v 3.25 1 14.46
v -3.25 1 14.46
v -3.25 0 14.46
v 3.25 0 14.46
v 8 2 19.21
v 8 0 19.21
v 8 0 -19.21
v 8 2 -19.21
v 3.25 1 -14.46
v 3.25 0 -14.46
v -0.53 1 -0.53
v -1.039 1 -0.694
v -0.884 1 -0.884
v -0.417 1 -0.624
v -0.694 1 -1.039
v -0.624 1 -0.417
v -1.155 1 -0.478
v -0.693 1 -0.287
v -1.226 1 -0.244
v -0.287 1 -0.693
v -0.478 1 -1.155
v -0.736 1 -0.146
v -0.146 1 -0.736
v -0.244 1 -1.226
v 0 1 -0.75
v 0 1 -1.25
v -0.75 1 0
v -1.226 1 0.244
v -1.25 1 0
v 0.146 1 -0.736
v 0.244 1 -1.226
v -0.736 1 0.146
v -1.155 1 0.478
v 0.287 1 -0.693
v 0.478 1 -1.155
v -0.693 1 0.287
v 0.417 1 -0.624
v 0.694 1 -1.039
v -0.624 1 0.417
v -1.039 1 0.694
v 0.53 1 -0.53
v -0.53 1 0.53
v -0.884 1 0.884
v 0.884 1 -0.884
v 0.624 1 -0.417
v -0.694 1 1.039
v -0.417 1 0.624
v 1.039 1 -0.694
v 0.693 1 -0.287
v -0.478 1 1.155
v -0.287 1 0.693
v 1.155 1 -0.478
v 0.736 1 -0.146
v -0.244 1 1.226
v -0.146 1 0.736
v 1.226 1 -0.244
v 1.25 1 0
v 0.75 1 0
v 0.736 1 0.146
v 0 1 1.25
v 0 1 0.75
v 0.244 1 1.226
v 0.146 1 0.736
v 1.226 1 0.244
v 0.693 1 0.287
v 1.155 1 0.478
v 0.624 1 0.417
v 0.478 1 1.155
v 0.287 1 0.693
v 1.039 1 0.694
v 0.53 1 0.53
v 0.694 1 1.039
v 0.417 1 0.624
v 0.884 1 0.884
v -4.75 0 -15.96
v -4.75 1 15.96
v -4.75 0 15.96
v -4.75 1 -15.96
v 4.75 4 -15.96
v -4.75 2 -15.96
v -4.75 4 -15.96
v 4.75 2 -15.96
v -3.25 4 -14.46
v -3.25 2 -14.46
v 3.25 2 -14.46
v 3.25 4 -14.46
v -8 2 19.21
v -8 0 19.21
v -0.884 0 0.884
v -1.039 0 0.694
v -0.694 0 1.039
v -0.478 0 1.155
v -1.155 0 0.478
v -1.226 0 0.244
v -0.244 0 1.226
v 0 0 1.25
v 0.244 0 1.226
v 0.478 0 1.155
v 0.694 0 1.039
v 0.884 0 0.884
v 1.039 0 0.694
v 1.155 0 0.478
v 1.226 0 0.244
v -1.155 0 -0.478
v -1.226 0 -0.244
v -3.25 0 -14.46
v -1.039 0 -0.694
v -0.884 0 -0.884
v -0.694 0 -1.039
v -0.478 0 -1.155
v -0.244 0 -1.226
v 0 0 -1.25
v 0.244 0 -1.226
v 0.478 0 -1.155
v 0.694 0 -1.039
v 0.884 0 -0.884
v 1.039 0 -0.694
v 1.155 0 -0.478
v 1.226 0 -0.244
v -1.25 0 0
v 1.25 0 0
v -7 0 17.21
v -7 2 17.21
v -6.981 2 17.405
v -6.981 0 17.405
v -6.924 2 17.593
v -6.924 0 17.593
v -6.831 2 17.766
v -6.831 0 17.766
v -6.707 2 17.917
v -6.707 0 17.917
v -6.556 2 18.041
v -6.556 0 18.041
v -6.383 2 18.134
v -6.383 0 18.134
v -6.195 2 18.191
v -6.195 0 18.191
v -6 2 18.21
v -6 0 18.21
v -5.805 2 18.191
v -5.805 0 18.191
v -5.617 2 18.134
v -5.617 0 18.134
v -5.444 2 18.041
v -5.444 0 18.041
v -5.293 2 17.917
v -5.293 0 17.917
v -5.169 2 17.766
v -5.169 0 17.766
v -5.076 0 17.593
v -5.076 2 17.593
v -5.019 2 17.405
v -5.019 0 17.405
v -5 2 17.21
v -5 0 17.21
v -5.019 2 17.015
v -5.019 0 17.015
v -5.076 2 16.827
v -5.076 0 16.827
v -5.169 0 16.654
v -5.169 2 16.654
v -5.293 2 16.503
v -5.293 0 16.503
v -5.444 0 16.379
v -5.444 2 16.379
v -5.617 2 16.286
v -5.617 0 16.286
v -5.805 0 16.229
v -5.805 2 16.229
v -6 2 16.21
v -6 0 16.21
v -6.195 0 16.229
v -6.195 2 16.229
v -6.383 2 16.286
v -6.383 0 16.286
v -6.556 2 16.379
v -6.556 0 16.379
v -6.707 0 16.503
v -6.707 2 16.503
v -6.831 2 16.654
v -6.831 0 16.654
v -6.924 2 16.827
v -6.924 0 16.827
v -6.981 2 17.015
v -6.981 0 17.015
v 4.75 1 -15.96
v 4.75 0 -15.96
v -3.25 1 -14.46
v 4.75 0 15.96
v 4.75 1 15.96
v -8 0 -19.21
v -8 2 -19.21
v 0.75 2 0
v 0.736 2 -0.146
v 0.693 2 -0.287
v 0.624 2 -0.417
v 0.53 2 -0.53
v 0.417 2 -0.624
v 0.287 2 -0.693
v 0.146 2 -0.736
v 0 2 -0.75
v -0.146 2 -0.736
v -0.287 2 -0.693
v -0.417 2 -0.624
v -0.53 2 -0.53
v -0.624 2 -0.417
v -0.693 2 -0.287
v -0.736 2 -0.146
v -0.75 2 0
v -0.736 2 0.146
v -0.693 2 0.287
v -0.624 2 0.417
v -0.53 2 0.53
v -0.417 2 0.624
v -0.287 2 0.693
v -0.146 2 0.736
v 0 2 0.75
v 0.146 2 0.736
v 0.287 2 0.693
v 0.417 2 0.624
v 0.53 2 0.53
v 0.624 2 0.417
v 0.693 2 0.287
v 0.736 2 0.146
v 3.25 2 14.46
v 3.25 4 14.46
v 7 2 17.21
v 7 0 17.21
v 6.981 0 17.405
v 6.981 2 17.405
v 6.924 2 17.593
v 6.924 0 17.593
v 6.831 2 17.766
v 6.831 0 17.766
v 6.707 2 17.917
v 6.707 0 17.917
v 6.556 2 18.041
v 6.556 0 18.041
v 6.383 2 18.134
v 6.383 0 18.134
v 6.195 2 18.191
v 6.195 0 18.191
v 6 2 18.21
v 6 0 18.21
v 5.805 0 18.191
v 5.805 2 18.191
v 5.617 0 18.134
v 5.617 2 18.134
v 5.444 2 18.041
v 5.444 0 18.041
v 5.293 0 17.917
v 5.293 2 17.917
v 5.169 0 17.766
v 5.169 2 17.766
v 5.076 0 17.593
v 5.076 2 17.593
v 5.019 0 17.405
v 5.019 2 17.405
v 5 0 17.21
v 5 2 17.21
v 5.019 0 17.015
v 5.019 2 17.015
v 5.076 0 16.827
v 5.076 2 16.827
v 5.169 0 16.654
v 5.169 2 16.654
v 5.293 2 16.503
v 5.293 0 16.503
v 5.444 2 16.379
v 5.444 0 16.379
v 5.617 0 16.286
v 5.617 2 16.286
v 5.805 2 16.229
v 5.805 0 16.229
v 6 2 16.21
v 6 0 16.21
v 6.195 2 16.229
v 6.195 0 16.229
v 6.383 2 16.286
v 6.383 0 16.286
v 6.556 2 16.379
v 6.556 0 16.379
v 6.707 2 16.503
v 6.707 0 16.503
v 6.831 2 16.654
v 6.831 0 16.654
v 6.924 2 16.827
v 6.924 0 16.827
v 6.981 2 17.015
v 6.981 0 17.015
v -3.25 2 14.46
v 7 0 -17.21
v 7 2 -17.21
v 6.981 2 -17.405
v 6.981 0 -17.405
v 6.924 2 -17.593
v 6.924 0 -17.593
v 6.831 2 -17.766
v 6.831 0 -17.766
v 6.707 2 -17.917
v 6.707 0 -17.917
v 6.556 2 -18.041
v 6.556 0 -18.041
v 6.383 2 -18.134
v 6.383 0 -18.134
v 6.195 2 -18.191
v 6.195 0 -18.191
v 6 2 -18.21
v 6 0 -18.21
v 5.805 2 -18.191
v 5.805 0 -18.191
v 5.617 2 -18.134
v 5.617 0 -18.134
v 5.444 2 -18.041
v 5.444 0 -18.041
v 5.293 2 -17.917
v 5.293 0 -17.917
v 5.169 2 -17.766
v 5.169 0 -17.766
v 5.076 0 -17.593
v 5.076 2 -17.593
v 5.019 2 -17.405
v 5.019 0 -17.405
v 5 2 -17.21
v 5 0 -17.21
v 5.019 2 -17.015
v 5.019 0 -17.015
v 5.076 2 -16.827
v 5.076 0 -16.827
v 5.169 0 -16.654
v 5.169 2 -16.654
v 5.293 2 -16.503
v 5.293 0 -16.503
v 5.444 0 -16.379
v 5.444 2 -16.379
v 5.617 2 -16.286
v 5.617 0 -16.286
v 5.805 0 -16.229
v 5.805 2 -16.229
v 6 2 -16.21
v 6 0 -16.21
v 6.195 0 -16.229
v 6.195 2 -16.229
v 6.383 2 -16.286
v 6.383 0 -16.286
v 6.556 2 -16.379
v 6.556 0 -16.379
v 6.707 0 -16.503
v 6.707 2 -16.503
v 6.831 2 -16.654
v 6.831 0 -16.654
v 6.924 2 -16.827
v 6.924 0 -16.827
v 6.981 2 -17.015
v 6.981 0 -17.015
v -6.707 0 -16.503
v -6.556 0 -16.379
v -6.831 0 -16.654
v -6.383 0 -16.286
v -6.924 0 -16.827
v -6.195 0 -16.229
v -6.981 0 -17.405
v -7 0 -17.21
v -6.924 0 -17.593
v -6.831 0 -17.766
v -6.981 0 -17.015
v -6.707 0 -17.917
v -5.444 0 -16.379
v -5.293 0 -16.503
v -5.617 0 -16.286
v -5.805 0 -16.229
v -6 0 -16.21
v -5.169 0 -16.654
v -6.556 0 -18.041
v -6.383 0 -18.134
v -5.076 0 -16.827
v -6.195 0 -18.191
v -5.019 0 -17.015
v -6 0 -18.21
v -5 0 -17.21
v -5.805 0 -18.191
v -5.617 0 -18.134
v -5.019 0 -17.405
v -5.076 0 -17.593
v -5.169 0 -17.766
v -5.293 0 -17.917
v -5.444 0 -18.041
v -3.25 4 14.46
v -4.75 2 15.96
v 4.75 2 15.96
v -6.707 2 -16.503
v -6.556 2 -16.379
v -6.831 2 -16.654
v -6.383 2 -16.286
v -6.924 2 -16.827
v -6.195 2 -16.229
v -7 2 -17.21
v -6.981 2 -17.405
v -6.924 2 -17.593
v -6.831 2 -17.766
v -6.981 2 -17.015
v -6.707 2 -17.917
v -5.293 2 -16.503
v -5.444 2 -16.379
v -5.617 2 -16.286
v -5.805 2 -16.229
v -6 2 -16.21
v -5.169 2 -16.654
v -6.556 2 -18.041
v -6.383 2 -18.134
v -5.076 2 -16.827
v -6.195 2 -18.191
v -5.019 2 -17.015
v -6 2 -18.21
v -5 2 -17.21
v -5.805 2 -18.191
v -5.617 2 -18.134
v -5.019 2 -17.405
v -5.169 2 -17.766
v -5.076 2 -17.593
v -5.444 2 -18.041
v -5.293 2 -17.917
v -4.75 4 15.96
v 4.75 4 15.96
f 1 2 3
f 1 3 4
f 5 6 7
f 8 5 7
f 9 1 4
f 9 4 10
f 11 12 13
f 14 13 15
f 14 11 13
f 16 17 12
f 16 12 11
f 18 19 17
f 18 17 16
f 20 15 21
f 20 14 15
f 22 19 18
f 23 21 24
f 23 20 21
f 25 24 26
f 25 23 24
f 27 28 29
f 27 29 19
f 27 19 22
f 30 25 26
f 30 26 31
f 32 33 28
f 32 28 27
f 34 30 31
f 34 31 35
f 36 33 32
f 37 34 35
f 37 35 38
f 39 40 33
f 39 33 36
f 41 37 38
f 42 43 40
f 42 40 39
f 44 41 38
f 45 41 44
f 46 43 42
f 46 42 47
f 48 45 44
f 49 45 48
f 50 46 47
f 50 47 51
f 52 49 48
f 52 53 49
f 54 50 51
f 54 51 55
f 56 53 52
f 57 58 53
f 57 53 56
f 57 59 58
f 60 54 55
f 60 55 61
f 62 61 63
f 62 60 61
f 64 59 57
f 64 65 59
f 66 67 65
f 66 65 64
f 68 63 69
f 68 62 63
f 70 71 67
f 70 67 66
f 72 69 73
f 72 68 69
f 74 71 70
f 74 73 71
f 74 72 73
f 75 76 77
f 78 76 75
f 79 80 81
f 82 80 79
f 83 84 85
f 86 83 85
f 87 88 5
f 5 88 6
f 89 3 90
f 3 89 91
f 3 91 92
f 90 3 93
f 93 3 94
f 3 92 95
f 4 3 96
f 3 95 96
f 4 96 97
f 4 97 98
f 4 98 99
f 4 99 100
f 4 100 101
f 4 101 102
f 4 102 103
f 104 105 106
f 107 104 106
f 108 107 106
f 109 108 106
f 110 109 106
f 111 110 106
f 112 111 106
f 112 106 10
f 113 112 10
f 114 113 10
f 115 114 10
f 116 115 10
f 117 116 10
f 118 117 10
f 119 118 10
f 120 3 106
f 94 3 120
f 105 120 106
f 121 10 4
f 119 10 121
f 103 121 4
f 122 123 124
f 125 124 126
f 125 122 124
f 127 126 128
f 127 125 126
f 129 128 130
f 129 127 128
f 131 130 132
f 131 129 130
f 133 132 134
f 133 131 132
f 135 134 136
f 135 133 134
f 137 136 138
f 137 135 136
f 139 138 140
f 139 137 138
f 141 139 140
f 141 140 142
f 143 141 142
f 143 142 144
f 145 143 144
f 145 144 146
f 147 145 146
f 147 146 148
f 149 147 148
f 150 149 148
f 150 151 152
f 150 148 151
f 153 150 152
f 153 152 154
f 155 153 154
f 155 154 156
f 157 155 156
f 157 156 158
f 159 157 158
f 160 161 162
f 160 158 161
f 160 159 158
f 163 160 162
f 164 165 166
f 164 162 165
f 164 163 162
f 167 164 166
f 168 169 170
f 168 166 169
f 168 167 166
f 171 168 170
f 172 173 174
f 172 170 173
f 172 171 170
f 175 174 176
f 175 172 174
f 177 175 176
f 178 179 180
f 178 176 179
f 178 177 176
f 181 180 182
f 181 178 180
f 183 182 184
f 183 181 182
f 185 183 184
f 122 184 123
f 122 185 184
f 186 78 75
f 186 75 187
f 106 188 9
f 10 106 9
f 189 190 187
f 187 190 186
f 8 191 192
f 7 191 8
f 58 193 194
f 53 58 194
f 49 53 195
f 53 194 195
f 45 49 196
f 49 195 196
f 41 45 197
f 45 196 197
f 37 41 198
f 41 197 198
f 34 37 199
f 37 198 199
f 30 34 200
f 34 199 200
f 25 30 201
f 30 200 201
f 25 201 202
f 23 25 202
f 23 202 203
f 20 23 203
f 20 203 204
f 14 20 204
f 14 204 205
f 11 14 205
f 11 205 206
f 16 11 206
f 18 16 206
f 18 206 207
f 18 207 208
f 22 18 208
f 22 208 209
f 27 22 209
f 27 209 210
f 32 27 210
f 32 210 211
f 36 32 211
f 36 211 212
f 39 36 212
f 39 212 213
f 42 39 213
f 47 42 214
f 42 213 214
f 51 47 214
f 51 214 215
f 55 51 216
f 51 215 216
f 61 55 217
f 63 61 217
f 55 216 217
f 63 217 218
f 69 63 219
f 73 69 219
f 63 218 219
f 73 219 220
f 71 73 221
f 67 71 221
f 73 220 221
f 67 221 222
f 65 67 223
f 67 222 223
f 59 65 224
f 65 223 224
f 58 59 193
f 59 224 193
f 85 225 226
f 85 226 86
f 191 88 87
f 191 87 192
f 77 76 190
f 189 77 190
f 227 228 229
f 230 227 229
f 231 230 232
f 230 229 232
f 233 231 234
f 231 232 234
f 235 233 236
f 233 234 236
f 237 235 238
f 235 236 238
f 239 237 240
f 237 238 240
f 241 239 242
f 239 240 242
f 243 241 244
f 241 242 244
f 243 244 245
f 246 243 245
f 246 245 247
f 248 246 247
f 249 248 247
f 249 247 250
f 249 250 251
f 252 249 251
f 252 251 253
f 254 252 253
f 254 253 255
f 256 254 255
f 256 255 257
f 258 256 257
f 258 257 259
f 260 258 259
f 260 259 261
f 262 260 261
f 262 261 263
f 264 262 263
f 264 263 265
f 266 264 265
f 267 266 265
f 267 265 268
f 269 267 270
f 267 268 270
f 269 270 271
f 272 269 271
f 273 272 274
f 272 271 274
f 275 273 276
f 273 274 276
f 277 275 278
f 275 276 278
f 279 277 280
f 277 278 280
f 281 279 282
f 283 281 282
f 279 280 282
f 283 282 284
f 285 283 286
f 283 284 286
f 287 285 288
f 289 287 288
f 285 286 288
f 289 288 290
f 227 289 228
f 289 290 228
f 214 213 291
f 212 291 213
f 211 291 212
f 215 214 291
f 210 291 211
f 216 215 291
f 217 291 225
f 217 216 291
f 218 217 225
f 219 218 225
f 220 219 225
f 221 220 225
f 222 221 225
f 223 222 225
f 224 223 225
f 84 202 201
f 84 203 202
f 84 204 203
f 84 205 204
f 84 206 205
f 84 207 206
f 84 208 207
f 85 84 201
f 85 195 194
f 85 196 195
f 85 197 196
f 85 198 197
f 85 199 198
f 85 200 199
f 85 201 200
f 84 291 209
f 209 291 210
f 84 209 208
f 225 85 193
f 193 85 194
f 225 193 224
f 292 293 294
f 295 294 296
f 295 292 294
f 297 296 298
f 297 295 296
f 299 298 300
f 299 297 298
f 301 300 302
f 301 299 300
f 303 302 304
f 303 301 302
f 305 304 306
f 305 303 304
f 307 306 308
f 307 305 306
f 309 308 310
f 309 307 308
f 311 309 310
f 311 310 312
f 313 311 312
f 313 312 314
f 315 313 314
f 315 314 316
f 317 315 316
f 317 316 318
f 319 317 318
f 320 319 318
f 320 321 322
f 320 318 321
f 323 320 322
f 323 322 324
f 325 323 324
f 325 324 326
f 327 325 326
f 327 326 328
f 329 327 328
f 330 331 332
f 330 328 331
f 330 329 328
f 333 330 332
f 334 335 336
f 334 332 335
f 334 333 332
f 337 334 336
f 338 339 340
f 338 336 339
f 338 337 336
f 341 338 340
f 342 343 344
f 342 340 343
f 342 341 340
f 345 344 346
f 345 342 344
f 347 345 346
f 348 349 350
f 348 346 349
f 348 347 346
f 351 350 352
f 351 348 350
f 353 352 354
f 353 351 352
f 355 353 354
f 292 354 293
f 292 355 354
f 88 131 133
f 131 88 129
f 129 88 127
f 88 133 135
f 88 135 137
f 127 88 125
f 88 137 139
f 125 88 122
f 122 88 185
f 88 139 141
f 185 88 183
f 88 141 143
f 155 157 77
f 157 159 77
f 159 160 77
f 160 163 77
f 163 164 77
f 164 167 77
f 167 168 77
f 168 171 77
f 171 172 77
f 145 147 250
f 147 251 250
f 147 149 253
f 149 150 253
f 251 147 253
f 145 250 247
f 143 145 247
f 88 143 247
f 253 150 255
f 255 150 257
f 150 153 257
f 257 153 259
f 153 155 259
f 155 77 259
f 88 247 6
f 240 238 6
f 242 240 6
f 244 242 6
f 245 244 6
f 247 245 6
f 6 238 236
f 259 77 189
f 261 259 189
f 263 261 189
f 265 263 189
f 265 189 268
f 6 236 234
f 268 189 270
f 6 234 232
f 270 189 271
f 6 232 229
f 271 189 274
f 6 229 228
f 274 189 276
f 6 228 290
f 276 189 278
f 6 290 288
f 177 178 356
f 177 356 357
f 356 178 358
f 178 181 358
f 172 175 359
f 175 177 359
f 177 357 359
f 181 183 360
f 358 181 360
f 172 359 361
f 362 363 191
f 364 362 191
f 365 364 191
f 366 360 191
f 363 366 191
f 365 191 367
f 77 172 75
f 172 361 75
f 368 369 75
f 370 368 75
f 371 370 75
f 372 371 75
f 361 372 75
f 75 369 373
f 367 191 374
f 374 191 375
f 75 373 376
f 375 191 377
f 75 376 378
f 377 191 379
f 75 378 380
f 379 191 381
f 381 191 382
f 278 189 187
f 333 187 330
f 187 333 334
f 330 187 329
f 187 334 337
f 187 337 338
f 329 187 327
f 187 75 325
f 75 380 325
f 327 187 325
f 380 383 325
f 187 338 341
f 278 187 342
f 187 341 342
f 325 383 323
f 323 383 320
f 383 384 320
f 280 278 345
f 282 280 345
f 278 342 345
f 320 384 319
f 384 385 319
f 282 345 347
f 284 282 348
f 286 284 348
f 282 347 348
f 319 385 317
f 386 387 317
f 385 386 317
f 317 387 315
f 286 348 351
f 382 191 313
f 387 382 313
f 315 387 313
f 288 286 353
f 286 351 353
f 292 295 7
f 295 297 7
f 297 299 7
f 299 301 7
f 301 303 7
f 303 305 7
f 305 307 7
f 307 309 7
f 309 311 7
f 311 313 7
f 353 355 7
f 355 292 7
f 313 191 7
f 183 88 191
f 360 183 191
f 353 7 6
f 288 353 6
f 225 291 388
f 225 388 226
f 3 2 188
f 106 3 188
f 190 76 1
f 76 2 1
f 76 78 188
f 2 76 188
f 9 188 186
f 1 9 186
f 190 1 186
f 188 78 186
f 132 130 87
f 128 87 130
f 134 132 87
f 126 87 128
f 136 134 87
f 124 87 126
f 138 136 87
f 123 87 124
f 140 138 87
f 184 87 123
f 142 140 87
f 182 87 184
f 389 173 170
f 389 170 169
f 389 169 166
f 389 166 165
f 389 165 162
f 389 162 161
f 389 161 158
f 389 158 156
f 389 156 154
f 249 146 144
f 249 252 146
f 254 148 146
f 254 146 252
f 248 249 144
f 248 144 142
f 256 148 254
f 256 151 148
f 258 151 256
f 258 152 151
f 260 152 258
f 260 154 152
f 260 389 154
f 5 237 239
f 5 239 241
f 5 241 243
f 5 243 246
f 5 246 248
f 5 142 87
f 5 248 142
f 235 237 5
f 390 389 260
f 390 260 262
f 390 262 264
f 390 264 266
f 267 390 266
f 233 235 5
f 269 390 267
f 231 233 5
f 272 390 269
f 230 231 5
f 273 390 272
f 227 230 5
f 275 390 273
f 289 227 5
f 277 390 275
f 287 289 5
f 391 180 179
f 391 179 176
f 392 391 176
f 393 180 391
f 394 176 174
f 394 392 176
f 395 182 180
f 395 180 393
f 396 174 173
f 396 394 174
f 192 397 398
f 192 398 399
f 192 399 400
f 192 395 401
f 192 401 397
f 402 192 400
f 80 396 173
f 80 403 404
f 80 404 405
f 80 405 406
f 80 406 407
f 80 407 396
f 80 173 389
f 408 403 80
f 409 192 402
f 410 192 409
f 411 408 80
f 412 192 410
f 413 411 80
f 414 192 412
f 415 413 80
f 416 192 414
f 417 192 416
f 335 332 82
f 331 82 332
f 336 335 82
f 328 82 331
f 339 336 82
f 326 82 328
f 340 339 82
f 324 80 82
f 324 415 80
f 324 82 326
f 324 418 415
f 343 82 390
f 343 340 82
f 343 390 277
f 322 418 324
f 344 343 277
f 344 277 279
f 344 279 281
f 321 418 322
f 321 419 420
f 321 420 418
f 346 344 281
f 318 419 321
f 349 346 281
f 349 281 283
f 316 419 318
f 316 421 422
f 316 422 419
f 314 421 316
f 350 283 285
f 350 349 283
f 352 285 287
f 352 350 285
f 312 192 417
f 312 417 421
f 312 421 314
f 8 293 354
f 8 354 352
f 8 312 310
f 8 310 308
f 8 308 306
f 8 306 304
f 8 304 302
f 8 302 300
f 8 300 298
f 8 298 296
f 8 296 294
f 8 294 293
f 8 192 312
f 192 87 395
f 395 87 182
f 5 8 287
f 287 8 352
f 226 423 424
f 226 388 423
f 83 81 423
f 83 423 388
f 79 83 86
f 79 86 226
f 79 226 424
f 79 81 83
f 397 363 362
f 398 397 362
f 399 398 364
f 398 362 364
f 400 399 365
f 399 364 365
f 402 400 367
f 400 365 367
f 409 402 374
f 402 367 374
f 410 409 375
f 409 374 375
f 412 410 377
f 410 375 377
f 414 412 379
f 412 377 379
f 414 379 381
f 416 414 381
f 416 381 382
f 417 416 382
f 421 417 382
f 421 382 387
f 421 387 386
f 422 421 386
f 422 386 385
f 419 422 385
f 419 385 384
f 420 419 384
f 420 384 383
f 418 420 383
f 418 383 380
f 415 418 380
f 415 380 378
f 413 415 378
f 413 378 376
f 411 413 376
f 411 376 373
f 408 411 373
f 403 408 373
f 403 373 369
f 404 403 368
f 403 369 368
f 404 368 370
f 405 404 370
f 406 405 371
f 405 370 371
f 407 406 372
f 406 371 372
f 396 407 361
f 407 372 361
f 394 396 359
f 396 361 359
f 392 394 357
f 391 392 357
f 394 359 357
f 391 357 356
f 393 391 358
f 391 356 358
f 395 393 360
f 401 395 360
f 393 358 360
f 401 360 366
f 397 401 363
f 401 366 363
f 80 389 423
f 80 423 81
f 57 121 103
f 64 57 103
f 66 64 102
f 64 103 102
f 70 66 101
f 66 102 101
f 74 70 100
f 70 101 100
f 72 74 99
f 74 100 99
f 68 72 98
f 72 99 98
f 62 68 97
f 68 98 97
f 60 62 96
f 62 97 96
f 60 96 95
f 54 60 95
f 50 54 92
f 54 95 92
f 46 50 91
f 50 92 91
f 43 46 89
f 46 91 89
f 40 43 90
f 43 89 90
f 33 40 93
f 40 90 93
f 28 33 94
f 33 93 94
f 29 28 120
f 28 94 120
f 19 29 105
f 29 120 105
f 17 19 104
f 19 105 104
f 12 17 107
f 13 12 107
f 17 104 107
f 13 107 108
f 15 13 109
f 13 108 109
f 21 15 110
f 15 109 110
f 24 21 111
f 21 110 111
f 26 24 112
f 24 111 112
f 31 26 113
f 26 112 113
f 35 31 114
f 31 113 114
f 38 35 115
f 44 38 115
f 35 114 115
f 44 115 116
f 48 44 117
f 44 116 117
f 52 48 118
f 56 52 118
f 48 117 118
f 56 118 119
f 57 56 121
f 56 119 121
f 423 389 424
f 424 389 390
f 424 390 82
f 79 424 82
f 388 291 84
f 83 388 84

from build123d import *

# Parameters (mm, degrees)
SKETCH1_W               = 16
SKETCH1_H               = 38.42
BOSS_EXTRUDE1_DEPTH     = 2
SKETCH2_W               = 9.5
SKETCH2_H               = 31.92
SKETCH2_W_2             = 6.5
SKETCH2_H_2             = 28.92
EXTRUDE_THIN1_DEPTH     = 2
SKETCH3_R               = 1
CUT_EXTRUDE1_DEPTH      = 5
MIRROR2_COPY_1_SKETCH_R = 1
MIRROR2_COPY_1_DEPTH    = 5
CUT_EXTRUDE_THIN1_START = -1
SKETCH2_3_W             = 9.5
SKETCH2_3_H             = 31.92
SKETCH2_3_W_2           = 6.5
SKETCH2_3_H_2           = 28.92
CUT_EXTRUDE_THIN1_DEPTH = 2
SKETCH5_R               = 0.75
CUT_EXTRUDE2_DEPTH      = 3
CUT_EXTRUDE2_DEPTH_BACK = 3
SKETCH6_R               = 1.25
CUT_EXTRUDE3_DEPTH      = 1


with BuildPart() as part:
    # Sketch1 → Boss-Extrude1 (new body)
    with BuildSketch(Plane(origin=(0, 0, 0), x_dir=(1, 0, 0), z_dir=(0, 1, 0))):
        Rectangle(SKETCH1_W, SKETCH1_H)
    extrude(amount=BOSS_EXTRUDE1_DEPTH)

    # Sketch2 → Extrude-Thin1 (add)
    with BuildSketch(Plane(origin=(0, 2, 0), x_dir=(1, 0, 0), z_dir=(0, 1, 0))):
        Rectangle(SKETCH2_W, SKETCH2_H)
        Rectangle(SKETCH2_W_2, SKETCH2_H_2, mode=Mode.SUBTRACT)
    extrude(amount=EXTRUDE_THIN1_DEPTH)

    # Sketch3 → Cut-Extrude1 (cut, through all)
    with BuildSketch(Plane.XZ):
        with Locations((6, 17.21)):
            Circle(SKETCH3_R)
    cut_extrude1 = extrude(amount=-CUT_EXTRUDE1_DEPTH, mode=Mode.SUBTRACT)

    # Mirror1: Cut-Extrude1 across plane
    add(cut_extrude1.mirror(Plane(origin=(0, 0, 0), x_dir=(1, 0, 0), z_dir=(0, 0, -1))), mode=Mode.SUBTRACT)

    # Mirror2: Cut-Extrude1 across plane
    add(cut_extrude1.mirror(Plane.ZY), mode=Mode.SUBTRACT)

    # Mirror2 copy 1 sketch → Mirror2 copy 1 (cut, through all)
    with BuildSketch(Plane(origin=(0, 0, 0), x_dir=(-1, 0, 0), z_dir=(0, -1, 0))):
        with Locations((6, 17.21)):
            Circle(MIRROR2_COPY_1_SKETCH_R)
    extrude(amount=-MIRROR2_COPY_1_DEPTH, mode=Mode.SUBTRACT)

    # Sketch2<3> → Cut-Extrude-Thin1 (cut)
    with BuildSketch(Plane(origin=(0, 2, 0), x_dir=(1, 0, 0), z_dir=(0, 1, 0)).offset(CUT_EXTRUDE_THIN1_START)):
        Rectangle(SKETCH2_3_W, SKETCH2_3_H)
        Rectangle(SKETCH2_3_W_2, SKETCH2_3_H_2, mode=Mode.SUBTRACT)
    extrude(amount=-CUT_EXTRUDE_THIN1_DEPTH, mode=Mode.SUBTRACT)

    # Sketch5 → Cut-Extrude2 (cut, two sides)
    with BuildSketch(Plane(origin=(0, 2, 0), x_dir=(1, 0, 0), z_dir=(0, 1, 0))) as cut_extrude2_sk:
        Circle(SKETCH5_R)
    extrude(amount=CUT_EXTRUDE2_DEPTH, mode=Mode.SUBTRACT)
    extrude(cut_extrude2_sk.sketch, amount=-CUT_EXTRUDE2_DEPTH_BACK, mode=Mode.SUBTRACT)

    # Sketch6 → Cut-Extrude3 (cut)
    with BuildSketch(Plane.XZ):
        Circle(SKETCH6_R)
    extrude(amount=-CUT_EXTRUDE3_DEPTH, mode=Mode.SUBTRACT)


solid = part.part
